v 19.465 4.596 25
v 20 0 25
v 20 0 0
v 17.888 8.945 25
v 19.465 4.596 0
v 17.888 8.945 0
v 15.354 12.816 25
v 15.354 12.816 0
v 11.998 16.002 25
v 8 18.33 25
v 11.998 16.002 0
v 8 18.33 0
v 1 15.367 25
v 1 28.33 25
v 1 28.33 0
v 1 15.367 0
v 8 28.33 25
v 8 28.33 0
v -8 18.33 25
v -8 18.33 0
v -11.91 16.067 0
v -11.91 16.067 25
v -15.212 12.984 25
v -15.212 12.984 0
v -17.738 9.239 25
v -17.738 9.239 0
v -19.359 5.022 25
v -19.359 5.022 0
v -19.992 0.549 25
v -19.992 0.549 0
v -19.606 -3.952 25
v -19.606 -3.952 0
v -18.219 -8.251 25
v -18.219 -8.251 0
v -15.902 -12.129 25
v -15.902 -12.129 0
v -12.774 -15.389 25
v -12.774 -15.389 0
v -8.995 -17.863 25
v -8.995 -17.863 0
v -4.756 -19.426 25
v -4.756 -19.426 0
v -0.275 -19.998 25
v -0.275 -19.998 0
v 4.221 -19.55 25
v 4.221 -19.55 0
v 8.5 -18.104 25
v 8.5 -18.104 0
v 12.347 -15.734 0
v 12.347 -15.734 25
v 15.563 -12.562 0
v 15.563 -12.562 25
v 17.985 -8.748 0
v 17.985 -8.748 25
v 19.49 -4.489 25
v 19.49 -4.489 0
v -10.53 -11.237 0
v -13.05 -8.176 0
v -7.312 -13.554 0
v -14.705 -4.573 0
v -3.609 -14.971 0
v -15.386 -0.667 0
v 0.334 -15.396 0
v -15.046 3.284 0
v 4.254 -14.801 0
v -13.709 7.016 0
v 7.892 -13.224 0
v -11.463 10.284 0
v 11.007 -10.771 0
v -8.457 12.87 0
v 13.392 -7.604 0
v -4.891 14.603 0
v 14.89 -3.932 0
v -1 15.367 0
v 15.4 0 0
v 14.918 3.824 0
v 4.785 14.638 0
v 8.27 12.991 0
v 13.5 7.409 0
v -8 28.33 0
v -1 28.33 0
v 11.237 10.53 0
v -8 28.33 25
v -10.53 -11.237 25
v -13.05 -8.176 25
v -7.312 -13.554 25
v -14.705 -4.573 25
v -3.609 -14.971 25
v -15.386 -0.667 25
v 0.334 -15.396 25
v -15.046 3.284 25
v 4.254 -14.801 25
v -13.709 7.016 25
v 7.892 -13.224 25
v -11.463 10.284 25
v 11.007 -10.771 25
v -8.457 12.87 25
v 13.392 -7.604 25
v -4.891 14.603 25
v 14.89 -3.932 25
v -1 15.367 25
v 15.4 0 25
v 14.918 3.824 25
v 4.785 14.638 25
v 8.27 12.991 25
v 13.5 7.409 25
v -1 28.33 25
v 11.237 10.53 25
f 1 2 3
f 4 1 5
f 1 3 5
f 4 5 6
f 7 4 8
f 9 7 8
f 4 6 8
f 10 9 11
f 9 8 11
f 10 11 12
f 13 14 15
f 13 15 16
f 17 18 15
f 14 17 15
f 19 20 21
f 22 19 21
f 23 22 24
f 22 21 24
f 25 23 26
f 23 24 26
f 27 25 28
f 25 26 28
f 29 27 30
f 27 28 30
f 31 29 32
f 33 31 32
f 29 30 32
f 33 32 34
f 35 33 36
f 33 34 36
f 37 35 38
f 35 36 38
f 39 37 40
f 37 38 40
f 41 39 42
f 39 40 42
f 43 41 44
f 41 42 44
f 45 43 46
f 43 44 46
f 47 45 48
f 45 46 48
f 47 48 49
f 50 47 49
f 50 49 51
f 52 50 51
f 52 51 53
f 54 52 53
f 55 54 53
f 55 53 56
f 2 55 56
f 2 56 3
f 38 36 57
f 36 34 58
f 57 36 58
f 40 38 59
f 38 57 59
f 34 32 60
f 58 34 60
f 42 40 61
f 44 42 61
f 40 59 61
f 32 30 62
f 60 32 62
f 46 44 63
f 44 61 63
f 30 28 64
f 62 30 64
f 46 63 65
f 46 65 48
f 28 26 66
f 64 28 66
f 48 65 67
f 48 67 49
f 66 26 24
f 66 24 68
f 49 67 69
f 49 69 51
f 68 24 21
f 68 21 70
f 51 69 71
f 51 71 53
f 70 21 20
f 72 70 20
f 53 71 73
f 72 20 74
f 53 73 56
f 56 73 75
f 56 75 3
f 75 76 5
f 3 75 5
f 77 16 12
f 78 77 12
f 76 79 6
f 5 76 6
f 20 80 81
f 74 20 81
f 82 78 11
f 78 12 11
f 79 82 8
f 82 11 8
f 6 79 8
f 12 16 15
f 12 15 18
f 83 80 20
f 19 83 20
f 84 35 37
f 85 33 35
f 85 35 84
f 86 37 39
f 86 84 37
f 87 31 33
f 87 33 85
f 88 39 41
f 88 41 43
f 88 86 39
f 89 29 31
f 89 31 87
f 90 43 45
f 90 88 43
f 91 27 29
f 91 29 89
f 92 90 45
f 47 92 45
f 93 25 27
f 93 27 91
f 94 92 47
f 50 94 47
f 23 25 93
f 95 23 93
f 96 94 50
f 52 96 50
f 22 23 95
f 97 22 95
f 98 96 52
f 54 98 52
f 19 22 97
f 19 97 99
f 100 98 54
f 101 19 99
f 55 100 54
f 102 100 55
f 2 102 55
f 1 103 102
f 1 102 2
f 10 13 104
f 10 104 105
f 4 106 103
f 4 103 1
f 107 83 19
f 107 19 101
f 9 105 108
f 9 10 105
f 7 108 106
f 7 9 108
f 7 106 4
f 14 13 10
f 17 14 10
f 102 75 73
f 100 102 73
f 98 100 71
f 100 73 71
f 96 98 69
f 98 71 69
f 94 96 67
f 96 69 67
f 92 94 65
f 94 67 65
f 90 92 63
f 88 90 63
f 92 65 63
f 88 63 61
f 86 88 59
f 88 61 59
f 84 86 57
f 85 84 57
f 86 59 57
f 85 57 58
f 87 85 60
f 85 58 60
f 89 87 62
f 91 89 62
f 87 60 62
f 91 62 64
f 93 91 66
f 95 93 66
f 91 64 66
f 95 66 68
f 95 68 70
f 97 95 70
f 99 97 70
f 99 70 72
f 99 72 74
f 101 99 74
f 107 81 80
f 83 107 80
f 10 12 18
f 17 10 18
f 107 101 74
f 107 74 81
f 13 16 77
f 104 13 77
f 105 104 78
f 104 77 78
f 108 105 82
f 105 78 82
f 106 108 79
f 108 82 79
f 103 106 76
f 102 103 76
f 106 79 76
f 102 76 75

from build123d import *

# Parameters (mm, degrees)
F1_DEPTH = 25


# Not quite as in the source:
# - a feature names something its author has since deleted; it is built from what else it names


with BuildPart() as f1:
    # F0 (on Top) → F1 (new body)
    with BuildSketch(Plane.XY):
        with BuildLine():
            ThreePointArc((1, 15.3674981698), (11.2374374303, 10.5299572649), (15.4, 0))
            ThreePointArc((15.4, 0), (-10.5299572649, -11.2374374303), (-1, 15.3674981698))
            Line((-1, 15.3674981698), (-1, 19.9749843554))
            ThreePointArc((-1, 19.9749843554), (-4.5745212177, 19.4698165279), (-8, 18.3303027798))
            ThreePointArc((-8, 18.3303027798), (-10.9544511501, -16.7332005307), (20, 0))
            ThreePointArc((20, 0), (16.7332005307, 10.9544511501), (8, 18.3303027798))
            ThreePointArc((8, 18.3303027798), (4.5745212177, 19.4698165279), (1, 19.9749843554))
            Line((1, 19.9749843554), (1, 15.3674981698))
        make_face()
        with BuildLine():
            Line((1, 28.3303027798), (1, 19.9749843554))
            ThreePointArc((1, 19.9749843554), (4.5745212177, 19.4698165279), (8, 18.3303027798))
            Line((8, 18.3303027798), (8, 28.3303027798))
            Line((8, 28.3303027798), (1, 28.3303027798))
        make_face()
        with BuildLine():
            ThreePointArc((-8, 18.3303027798), (-4.5745212177, 19.4698165279), (-1, 19.9749843554))
            Line((-1, 19.9749843554), (-1, 28.3303027798))
            Line((-1, 28.3303027798), (-8, 28.3303027798))
            Line((-8, 28.3303027798), (-8, 18.3303027798))
        make_face()
    extrude(amount=F1_DEPTH)


solid = f1.part
